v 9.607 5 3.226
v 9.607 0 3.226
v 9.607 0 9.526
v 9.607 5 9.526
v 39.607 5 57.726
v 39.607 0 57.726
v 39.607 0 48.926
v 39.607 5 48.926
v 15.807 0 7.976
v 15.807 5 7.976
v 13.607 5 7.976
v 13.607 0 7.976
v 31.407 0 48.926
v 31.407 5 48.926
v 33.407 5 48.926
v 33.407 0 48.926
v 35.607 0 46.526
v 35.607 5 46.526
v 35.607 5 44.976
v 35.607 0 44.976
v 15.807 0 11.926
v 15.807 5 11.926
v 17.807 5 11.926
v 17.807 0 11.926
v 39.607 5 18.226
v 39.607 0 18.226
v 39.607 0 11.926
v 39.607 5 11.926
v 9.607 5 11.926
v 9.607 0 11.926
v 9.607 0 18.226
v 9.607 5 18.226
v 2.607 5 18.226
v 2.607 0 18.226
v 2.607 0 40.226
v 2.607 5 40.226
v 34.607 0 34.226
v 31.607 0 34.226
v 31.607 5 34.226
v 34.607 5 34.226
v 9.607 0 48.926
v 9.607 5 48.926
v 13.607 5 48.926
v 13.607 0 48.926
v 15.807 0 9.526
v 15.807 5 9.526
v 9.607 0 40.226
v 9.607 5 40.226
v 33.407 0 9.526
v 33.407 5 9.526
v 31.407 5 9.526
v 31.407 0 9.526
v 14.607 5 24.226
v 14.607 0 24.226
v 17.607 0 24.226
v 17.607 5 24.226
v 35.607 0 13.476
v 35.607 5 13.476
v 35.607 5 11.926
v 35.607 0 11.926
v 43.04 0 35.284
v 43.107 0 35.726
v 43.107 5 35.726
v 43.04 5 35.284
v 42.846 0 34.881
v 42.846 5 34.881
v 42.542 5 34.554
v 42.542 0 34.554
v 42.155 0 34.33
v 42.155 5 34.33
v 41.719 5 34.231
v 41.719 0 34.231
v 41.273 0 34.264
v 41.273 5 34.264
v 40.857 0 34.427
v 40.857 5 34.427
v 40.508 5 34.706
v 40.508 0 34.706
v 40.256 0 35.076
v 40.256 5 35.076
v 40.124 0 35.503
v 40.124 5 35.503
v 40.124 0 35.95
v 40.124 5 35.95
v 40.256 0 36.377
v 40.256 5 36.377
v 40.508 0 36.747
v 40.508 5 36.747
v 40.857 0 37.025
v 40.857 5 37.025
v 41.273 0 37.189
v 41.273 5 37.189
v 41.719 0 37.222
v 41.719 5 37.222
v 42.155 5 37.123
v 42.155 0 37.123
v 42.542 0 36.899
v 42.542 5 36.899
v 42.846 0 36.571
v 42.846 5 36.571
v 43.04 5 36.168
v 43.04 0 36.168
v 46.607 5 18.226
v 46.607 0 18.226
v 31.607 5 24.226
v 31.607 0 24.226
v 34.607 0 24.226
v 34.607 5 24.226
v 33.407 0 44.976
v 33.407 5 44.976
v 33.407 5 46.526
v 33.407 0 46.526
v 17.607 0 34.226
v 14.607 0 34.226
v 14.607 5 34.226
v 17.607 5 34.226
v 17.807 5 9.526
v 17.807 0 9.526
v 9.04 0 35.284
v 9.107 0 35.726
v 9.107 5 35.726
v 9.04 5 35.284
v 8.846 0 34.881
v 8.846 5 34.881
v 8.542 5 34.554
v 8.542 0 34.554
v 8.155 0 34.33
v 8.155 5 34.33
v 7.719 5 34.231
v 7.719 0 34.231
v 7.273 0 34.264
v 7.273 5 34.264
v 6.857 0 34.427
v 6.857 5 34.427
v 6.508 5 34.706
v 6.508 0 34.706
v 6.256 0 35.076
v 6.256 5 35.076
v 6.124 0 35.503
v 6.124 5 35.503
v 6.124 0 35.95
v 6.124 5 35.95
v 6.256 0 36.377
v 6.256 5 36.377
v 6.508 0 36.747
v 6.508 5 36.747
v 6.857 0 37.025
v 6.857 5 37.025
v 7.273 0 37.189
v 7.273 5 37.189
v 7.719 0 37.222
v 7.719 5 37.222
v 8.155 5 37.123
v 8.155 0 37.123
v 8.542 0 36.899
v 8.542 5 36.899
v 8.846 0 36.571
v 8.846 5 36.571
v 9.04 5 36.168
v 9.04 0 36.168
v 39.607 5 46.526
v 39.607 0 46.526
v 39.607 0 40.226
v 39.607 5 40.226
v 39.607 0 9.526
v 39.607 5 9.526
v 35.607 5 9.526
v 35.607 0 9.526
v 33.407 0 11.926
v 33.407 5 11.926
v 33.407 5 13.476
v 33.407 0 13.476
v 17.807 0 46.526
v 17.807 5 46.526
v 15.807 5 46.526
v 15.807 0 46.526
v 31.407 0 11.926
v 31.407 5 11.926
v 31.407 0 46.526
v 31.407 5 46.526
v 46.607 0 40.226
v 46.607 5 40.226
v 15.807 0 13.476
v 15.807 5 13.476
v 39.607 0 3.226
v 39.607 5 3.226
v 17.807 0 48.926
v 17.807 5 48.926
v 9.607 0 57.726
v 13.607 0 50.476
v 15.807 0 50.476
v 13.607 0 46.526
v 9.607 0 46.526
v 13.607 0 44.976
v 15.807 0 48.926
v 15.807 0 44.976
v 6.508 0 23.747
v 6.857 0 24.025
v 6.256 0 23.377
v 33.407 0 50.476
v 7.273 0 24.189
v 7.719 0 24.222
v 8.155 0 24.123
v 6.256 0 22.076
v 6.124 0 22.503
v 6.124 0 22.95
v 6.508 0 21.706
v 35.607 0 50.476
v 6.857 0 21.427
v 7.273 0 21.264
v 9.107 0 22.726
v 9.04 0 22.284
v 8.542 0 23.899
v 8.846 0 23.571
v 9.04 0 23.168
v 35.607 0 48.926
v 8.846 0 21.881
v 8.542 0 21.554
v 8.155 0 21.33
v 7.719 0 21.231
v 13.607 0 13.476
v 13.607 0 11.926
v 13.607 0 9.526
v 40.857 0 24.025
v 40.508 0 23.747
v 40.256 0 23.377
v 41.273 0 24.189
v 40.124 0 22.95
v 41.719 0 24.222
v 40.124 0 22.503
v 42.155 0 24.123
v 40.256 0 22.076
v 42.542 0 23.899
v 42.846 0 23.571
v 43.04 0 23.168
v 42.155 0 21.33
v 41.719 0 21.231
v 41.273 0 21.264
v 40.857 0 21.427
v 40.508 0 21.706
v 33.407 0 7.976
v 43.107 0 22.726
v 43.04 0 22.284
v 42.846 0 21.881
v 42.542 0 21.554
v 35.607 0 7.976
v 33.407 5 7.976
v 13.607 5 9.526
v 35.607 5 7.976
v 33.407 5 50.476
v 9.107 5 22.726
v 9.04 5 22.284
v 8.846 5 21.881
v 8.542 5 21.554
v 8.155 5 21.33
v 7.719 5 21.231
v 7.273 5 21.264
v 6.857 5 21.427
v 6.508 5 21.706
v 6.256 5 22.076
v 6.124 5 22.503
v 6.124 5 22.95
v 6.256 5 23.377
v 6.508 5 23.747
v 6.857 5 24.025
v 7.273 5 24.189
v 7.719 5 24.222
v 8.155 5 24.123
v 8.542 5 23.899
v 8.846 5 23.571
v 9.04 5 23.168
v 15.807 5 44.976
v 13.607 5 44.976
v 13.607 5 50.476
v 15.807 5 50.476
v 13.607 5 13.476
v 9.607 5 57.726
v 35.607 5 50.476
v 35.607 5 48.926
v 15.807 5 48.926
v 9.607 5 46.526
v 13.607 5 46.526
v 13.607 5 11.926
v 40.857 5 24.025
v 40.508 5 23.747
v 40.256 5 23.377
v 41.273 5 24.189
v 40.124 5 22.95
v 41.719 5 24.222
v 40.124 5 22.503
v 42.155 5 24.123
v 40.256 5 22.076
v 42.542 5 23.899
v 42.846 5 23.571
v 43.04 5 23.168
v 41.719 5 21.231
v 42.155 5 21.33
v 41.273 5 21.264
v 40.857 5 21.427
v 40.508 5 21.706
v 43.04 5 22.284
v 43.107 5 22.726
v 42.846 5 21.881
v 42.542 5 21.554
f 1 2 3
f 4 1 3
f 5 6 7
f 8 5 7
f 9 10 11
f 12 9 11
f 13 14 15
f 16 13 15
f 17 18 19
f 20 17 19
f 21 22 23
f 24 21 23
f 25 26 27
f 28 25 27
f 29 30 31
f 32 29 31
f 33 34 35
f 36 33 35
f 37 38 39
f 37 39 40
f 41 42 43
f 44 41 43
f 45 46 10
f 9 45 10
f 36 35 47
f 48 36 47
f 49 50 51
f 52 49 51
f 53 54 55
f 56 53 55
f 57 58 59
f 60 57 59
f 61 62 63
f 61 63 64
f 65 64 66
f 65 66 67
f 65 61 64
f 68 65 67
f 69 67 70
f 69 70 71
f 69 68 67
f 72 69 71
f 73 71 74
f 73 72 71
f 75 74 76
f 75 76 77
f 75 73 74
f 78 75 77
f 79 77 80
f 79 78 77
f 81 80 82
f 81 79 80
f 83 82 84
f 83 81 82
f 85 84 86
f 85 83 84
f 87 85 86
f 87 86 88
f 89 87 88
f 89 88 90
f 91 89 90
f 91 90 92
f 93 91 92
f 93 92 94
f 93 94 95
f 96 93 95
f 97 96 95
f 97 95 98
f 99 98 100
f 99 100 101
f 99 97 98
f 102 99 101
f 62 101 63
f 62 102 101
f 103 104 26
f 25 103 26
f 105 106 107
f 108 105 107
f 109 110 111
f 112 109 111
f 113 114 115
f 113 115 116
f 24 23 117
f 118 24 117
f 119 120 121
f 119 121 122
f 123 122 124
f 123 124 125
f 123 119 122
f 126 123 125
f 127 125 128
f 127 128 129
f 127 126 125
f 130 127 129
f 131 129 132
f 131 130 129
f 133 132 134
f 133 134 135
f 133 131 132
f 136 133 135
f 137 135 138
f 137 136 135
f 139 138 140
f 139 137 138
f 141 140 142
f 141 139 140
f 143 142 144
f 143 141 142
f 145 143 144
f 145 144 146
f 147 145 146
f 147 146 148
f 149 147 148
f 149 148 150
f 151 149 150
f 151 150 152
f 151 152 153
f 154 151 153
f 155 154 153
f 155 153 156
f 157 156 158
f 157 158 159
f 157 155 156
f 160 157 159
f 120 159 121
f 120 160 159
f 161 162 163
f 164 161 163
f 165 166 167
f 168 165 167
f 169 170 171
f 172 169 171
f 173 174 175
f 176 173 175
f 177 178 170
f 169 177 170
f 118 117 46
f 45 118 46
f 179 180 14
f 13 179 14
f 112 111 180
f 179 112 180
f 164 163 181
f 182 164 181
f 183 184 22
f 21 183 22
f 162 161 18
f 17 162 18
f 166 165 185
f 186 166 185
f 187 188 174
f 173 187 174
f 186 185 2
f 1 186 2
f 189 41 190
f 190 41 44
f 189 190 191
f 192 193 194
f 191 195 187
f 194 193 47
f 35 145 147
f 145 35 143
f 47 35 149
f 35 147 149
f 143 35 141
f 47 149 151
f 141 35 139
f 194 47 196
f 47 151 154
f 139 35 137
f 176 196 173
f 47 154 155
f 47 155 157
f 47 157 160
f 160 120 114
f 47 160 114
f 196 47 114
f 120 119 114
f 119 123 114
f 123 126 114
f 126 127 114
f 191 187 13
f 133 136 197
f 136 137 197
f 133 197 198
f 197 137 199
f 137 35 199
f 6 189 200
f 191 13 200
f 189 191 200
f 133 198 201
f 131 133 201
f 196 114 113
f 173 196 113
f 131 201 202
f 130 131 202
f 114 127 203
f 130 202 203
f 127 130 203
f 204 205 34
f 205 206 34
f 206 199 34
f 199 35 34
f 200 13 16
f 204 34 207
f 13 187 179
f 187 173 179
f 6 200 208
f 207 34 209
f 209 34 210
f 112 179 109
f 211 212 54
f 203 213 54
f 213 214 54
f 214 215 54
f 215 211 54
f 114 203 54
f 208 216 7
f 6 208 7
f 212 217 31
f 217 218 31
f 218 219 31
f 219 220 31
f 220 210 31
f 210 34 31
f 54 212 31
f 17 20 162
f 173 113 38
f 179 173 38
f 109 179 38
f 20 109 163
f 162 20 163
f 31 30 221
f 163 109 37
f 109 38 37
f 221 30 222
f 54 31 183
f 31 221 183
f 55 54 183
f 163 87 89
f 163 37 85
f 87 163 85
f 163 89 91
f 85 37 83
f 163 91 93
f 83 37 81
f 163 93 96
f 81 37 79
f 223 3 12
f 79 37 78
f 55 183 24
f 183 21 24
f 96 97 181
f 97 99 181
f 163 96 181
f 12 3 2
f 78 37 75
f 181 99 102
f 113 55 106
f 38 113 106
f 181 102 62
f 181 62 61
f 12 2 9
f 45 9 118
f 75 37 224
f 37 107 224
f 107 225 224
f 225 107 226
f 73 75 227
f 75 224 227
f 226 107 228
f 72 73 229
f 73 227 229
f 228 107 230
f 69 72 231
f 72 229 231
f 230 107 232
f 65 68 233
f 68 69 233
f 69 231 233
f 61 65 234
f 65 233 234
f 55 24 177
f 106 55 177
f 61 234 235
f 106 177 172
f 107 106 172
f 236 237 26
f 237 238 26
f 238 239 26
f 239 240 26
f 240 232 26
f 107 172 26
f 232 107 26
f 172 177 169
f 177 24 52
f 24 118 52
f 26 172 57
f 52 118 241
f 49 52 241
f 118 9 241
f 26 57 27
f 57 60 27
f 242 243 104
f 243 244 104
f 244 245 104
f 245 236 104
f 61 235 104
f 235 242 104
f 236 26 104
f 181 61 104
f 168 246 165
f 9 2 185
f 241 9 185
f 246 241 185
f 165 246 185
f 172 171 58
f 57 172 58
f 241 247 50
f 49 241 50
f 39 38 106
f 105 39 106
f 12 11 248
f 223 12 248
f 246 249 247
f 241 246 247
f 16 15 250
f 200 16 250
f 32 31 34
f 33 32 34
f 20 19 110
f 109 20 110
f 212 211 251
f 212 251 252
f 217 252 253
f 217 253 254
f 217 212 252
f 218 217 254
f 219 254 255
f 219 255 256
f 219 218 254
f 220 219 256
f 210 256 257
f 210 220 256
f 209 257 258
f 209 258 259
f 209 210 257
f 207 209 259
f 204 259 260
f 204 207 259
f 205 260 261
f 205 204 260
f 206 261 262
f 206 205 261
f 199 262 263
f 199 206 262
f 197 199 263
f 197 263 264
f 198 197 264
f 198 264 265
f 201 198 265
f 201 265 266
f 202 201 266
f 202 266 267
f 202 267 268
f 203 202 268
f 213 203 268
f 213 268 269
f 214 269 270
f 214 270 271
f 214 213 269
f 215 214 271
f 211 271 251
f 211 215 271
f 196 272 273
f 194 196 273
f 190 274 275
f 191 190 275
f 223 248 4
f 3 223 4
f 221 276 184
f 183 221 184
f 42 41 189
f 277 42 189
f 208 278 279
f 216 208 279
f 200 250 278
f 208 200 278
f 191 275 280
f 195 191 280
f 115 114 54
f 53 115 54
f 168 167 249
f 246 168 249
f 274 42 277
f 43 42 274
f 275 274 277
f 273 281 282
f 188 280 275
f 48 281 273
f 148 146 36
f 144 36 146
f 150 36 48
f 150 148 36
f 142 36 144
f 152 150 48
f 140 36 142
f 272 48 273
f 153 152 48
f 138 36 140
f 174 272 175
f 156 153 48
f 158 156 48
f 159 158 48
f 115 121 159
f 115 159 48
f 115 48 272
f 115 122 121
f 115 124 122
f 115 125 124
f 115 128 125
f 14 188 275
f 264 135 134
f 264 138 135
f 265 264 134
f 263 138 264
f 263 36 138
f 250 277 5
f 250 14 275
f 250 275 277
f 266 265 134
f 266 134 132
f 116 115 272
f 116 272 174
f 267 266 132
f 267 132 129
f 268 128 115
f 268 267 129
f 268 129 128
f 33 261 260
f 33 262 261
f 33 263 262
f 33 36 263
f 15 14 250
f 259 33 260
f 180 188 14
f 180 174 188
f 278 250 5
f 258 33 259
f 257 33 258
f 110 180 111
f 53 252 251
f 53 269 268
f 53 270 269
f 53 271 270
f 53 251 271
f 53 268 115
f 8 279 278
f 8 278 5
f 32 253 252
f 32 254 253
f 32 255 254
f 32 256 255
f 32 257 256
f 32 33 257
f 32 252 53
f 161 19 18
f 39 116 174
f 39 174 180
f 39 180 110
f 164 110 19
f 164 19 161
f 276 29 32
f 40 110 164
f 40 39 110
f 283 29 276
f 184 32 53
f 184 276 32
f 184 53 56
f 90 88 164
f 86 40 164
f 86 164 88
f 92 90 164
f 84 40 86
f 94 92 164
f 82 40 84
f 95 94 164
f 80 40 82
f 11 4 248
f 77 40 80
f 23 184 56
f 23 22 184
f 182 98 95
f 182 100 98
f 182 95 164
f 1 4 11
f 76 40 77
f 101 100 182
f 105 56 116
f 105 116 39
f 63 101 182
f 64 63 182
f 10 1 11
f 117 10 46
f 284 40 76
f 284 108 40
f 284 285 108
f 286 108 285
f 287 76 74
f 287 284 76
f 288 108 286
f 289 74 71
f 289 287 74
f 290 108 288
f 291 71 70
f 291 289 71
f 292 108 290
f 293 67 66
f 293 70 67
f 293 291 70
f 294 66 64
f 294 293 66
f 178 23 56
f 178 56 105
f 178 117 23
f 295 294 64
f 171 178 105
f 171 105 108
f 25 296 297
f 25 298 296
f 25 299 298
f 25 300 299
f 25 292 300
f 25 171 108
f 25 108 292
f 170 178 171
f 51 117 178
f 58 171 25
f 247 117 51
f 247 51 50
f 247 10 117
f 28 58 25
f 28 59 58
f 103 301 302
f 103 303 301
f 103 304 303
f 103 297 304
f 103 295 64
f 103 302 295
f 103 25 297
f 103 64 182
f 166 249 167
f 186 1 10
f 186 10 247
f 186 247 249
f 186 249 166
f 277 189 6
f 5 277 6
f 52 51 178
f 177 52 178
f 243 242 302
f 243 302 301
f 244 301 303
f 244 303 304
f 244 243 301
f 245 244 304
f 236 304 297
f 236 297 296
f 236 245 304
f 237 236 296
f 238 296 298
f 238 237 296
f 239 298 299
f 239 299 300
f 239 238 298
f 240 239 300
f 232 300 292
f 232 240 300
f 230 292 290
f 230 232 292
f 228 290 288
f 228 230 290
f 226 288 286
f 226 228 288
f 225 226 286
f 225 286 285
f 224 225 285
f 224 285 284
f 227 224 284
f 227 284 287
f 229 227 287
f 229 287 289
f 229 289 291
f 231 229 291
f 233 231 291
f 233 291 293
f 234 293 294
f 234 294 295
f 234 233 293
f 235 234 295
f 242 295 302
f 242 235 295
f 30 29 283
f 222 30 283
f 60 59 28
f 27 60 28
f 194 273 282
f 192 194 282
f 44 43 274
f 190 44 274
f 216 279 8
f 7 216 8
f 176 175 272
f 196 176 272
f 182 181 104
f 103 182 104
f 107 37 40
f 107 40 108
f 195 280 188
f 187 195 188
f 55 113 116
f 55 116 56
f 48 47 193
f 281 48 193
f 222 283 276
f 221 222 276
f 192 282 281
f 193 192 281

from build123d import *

# Parameters (mm, degrees)
SKETCH2_R           = 1.5
SKETCH2_W           = 3
SKETCH2_H           = 10
BOSS_EXTRUDE2_DEPTH = 5
CUT_EXTRUDE1_DEPTH  = 6


with BuildPart() as part:
    # Sketch2 → Boss-Extrude2 (new body)
    with BuildSketch(Plane(origin=(0, 0, 0), x_dir=(1, 0, 0), z_dir=(0, 1, 0))):
        Polygon((9.607122403, -57.726350335), (39.607122403, -57.726350335), (39.607122403, -40.226350335), (46.607122403, -40.226350335), (46.607122403, -18.226350335), (39.607122403, -18.226350335), (39.607122403, -3.226350335), (9.607122403, -3.226350335), (9.607122403, -18.226350335), (2.607122403, -18.226350335), (2.607122403, -40.226350335), (9.607122403, -40.226350335), align=None)
        with Locations((41.607122403, -22.726350335)):
            Circle(SKETCH2_R, mode=Mode.SUBTRACT)
        with Locations((41.607122403, -35.726350335)):
            Circle(SKETCH2_R, mode=Mode.SUBTRACT)
        with Locations((7.607122403, -35.726350335)):
            Circle(SKETCH2_R, mode=Mode.SUBTRACT)
        with Locations((7.607122403, -22.726350335)):
            Circle(SKETCH2_R, mode=Mode.SUBTRACT)
        with Locations((33.107122403, -29.226350335)):
            Rectangle(SKETCH2_W, SKETCH2_H, mode=Mode.SUBTRACT)
        with Locations((16.107122403, -29.226350335)):
            Rectangle(SKETCH2_W, SKETCH2_H, mode=Mode.SUBTRACT)
    extrude(amount=BOSS_EXTRUDE2_DEPTH)

    # Sketch3 → Cut-Extrude1 (cut, through all)
    with BuildSketch(Plane(origin=(0, 5, 0), x_dir=(-1, 0, 0), z_dir=(0, 1, 0))):
        Polygon((-39.607122403, 46.526350335), (-35.607122403, 46.526350335), (-35.607122403, 44.976350335), (-33.407122403, 44.976350335), (-33.407122403, 46.526350335), (-31.407122403, 46.526350335), (-31.407122403, 48.926350335), (-33.407122403, 48.926350335), (-33.407122403, 50.476350335), (-35.607122403, 50.476350335), (-35.607122403, 48.926350335), (-39.607122403, 48.926350335), align=None)
        Polygon((-39.607122403, 9.526350335), (-35.607122403, 9.526350335), (-35.607122403, 7.976350335), (-33.407122403, 7.976350335), (-33.407122403, 9.526350335), (-31.407122403, 9.526350335), (-31.407122403, 11.926350335), (-33.407122403, 11.926350335), (-33.407122403, 13.476350335), (-35.607122403, 13.476350335), (-35.607122403, 11.926350335), (-39.607122403, 11.926350335), align=None)
        Polygon((-13.607122403, 50.476350335), (-15.807122403, 50.476350335), (-15.807122403, 48.926350335), (-17.807122403, 48.926350335), (-17.807122403, 46.526350335), (-15.807122403, 46.526350335), (-15.807122403, 44.976350335), (-13.607122403, 44.976350335), (-13.607122403, 46.526350335), (-9.607122403, 46.526350335), (-9.607122403, 48.926350335), (-13.607122403, 48.926350335), align=None)
        Polygon((-9.607122403, 11.926350335), (-13.607122403, 11.926350335), (-13.607122403, 13.476350335), (-15.807122403, 13.476350335), (-15.807122403, 11.926350335), (-17.807122403, 11.926350335), (-17.807122403, 9.526350335), (-15.807122403, 9.526350335), (-15.807122403, 7.976350335), (-13.607122403, 7.976350335), (-13.607122403, 9.526350335), (-9.607122403, 9.526350335), align=None)
    extrude(amount=-CUT_EXTRUDE1_DEPTH, mode=Mode.SUBTRACT)


solid = part.part
